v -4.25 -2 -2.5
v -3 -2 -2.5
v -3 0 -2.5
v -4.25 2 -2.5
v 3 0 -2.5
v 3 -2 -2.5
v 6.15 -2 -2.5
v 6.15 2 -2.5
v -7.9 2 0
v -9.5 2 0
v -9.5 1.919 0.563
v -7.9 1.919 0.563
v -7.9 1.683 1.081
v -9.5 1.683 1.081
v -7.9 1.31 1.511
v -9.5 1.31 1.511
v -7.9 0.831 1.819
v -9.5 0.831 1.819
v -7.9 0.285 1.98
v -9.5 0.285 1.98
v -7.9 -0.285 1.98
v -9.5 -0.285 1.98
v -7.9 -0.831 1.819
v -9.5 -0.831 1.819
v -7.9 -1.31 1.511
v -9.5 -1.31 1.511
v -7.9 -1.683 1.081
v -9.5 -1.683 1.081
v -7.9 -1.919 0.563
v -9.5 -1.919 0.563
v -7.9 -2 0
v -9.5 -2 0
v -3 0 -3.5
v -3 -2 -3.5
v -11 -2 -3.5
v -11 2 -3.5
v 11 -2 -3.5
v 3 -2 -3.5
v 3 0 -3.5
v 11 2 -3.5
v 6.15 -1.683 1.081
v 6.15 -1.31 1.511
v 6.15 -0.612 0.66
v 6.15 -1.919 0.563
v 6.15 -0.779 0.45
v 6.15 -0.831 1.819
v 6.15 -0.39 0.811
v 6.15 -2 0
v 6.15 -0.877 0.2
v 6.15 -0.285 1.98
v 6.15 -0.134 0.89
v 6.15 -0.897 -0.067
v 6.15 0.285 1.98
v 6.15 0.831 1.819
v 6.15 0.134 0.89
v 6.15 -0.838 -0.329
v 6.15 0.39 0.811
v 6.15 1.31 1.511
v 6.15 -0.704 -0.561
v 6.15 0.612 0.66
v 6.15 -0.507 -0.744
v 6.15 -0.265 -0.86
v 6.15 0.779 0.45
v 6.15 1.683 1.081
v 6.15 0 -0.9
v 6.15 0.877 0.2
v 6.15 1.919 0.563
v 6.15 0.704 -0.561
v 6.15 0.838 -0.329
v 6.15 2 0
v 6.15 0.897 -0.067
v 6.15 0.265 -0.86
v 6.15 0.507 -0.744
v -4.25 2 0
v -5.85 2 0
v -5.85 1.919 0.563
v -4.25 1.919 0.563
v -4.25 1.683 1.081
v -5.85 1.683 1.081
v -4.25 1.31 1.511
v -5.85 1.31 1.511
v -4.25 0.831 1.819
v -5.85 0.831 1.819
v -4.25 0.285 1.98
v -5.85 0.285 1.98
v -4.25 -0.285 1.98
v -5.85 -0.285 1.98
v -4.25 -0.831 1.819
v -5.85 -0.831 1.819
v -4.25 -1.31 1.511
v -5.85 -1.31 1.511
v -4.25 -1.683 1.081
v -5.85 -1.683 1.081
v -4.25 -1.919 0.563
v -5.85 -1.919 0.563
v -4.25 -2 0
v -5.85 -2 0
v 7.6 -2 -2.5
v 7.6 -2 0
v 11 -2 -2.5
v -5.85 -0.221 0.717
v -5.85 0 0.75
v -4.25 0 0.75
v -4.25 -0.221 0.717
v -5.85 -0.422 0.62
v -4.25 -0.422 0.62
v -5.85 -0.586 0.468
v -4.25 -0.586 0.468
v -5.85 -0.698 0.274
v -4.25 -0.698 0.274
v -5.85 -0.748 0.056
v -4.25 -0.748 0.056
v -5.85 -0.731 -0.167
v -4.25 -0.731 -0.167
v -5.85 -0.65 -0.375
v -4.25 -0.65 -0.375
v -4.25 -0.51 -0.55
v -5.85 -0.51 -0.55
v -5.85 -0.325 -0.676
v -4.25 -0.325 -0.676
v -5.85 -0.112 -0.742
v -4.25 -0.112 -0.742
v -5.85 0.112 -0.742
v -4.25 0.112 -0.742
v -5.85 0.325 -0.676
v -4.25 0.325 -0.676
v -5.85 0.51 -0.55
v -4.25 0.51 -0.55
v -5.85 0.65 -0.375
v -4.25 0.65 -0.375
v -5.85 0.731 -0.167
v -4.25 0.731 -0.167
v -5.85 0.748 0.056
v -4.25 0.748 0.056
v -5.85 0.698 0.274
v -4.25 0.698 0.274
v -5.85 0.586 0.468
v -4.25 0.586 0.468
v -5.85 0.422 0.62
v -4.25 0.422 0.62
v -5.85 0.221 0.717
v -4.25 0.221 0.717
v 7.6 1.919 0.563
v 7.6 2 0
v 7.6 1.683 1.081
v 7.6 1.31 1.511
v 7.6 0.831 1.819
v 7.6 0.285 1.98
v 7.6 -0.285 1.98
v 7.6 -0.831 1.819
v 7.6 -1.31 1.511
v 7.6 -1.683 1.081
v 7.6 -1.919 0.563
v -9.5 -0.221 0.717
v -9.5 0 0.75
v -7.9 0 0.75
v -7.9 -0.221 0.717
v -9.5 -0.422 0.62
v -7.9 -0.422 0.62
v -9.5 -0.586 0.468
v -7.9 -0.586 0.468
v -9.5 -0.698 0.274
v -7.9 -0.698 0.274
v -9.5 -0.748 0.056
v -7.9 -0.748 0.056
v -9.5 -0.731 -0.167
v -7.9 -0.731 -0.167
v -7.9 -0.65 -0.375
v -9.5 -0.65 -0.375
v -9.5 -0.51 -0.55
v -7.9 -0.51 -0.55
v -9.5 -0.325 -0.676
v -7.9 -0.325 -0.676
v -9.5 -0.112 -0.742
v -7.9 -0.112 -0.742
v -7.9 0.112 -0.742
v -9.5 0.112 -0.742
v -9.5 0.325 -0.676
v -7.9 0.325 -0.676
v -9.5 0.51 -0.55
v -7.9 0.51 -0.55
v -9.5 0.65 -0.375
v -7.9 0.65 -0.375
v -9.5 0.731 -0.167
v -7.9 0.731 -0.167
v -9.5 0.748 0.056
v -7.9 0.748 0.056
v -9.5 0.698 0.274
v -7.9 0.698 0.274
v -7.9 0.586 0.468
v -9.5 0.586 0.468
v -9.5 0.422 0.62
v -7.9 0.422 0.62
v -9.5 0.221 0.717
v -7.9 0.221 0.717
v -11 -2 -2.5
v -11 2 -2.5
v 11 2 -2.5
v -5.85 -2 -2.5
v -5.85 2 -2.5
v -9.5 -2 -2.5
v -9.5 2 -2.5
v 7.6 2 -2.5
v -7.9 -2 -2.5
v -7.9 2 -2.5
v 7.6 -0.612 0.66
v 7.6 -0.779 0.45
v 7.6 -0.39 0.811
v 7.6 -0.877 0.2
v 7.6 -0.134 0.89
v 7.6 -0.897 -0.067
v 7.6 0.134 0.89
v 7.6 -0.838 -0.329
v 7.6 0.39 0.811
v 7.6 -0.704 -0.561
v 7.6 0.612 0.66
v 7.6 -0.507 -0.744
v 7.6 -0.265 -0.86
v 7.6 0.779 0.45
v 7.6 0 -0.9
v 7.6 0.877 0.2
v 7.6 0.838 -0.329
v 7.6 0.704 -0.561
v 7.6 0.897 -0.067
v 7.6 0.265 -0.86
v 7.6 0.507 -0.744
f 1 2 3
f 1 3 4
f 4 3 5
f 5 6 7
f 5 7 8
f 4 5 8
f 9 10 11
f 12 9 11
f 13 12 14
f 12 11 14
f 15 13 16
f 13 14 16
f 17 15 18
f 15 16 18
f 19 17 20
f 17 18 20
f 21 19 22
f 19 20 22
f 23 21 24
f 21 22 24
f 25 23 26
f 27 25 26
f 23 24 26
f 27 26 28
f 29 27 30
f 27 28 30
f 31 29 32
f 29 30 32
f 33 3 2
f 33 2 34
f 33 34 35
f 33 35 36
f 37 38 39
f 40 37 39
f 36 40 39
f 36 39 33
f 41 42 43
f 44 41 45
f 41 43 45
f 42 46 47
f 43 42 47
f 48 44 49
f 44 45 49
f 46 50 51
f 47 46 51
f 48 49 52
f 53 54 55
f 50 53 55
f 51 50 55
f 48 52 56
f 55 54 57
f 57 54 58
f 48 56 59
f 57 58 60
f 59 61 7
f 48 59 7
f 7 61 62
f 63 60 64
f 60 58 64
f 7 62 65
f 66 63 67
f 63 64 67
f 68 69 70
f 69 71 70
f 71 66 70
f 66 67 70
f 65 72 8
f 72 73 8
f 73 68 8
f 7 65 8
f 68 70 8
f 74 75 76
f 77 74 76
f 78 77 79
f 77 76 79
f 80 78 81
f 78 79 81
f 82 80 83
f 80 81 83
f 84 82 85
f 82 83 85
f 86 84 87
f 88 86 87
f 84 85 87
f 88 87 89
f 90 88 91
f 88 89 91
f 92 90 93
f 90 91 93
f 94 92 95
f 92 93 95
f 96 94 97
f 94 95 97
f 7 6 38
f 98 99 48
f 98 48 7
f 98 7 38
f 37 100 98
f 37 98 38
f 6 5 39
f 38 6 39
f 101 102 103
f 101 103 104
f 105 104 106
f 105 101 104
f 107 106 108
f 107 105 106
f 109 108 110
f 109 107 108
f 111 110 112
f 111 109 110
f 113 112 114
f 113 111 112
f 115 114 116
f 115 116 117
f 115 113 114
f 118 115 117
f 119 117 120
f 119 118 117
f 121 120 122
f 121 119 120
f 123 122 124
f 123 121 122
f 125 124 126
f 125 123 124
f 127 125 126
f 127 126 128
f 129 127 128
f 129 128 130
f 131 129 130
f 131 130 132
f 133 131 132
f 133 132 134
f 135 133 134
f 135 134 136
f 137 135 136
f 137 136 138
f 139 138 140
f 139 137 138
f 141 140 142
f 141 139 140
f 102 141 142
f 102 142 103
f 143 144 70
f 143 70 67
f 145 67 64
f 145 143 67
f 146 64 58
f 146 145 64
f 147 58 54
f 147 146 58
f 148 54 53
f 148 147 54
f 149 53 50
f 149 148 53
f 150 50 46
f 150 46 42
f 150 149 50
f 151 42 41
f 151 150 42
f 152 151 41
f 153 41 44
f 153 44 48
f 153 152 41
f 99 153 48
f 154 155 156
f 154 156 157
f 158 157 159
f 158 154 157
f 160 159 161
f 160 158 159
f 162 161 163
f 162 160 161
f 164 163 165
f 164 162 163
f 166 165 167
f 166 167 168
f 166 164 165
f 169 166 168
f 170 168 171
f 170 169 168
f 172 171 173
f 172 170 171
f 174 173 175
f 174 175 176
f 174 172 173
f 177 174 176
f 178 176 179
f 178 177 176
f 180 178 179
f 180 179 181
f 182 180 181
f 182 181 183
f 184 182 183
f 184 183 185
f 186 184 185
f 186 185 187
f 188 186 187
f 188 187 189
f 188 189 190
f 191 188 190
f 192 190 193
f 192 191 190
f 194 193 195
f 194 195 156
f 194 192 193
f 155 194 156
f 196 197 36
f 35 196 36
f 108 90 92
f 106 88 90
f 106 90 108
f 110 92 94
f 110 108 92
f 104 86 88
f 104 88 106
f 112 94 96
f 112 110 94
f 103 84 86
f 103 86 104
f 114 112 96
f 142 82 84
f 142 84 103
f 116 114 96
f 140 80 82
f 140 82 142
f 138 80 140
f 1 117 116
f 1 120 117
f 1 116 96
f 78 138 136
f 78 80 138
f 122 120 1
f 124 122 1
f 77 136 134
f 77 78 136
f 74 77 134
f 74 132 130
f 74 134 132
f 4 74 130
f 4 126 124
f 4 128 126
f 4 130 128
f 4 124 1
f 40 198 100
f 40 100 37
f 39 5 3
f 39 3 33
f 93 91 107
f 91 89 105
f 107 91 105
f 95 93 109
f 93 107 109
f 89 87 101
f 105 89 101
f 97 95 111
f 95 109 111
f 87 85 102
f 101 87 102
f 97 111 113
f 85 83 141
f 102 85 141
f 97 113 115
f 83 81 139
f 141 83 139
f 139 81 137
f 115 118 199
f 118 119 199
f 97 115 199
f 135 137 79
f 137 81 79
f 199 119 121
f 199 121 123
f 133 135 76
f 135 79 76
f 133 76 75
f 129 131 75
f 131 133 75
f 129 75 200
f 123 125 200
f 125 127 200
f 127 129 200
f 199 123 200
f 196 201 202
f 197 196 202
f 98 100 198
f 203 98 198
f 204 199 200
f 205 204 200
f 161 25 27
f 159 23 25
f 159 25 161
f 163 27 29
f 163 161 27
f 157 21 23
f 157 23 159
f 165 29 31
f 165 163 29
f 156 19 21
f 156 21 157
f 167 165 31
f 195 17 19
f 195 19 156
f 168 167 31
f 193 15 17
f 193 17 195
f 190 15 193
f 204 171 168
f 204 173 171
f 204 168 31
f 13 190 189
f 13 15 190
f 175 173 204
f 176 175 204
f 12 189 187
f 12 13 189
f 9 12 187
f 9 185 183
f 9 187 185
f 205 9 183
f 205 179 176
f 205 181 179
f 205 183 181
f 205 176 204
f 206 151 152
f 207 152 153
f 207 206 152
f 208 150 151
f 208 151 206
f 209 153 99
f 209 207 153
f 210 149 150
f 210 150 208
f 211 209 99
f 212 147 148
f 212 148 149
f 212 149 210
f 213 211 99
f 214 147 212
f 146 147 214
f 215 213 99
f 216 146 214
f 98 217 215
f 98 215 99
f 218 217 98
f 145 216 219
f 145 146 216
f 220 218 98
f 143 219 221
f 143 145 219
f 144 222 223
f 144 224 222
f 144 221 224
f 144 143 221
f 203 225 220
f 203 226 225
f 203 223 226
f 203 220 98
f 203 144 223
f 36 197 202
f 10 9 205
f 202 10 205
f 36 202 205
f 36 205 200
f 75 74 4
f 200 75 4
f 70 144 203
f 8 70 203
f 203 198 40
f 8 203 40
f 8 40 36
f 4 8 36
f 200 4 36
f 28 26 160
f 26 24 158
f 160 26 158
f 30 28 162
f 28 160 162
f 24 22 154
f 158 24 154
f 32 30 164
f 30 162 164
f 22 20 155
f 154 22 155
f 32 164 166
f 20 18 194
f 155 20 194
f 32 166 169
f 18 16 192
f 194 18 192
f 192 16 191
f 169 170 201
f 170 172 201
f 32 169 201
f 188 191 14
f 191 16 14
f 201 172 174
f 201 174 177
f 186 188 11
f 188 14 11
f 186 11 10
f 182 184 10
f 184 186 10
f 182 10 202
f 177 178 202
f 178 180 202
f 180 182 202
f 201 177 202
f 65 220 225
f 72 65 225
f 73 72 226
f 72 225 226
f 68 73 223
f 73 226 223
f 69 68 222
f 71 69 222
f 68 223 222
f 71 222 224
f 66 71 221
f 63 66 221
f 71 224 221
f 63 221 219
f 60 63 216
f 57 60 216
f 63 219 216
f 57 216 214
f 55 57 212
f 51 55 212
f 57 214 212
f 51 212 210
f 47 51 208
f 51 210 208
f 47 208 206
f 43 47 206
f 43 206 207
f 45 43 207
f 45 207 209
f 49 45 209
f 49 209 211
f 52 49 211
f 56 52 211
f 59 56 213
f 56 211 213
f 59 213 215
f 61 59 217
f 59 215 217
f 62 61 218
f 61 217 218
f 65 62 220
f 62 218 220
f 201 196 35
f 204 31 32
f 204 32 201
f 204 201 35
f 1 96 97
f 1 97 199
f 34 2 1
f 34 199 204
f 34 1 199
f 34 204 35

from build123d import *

# Parameters (mm, degrees)
BOSS_EXTRUDE1_START = -9.5
SKETCH1_R           = 0.75
BOSS_EXTRUDE1_DEPTH = 1.6
BOSS_EXTRUDE2_START = -5.85
SKETCH1_3_R         = 0.75
BOSS_EXTRUDE2_DEPTH = 1.6
BOSS_EXTRUDE5_START = 7.6
SKETCH1_5_R         = 2
SKETCH1_5_R_2       = 0.9
BOSS_EXTRUDE5_DEPTH = 1.45
BOSS_EXTRUDE3_START = 11
SKETCH1_4_W         = 1
SKETCH1_4_H         = 4
BOSS_EXTRUDE3_DEPTH = 22
CUT_EXTRUDE1_START  = 3
SKETCH1_6_W         = 1
SKETCH1_6_H         = 2
CUT_EXTRUDE1_DEPTH  = 6


with BuildPart() as part:
    # Sketch1 → Boss-Extrude1 (new body)
    with BuildSketch(Plane(origin=(0, 0, 0), x_dir=(0, 0, -1), z_dir=(1, 0, 0)).offset(BOSS_EXTRUDE1_START)):
        with BuildLine():
            Line((2.5, 2), (0, 2))
            ThreePointArc((0, 2), (-2, 0), (0, -2))
            Line((0, -2), (2.5, -2))
            Line((2.5, -2), (2.5, 2))
        make_face()
        with Locations(Location((0, 0, 0), (0, 0, 180))):
            Circle(SKETCH1_R, mode=Mode.SUBTRACT)
    extrude(amount=BOSS_EXTRUDE1_DEPTH)



with BuildPart() as body_2:
    # Sketch1<3> → Boss-Extrude2 (new body)
    with BuildSketch(Plane(origin=(0, 0, 0), x_dir=(0, 0, -1), z_dir=(1, 0, 0)).offset(BOSS_EXTRUDE2_START)):
        with BuildLine():
            Line((2.5, 2), (0, 2))
            ThreePointArc((0, 2), (-2, 0), (0, -2))
            Line((0, -2), (2.5, -2))
            Line((2.5, -2), (2.5, 2))
        make_face()
        with Locations(Location((0, 0, 0), (0, 0, 180))):
            Circle(SKETCH1_3_R, mode=Mode.SUBTRACT)
    extrude(amount=BOSS_EXTRUDE2_DEPTH)


with BuildPart() as body_3:
    # Sketch1<5> → Boss-Extrude5 (new body)
    with BuildSketch(Plane(origin=(0, 0, 0), x_dir=(0, 0, -1), z_dir=(1, 0, 0)).offset(BOSS_EXTRUDE5_START)):
        Circle(SKETCH1_5_R)
        Circle(SKETCH1_5_R_2, mode=Mode.SUBTRACT)
        with BuildLine():
            Line((2.5, 2), (0, 2))
            ThreePointArc((0, 2), (1.414213562, 1.414213562), (2, 0))
            ThreePointArc((2, 0), (1.414213562, -1.414213562), (0, -2))
            Line((0, -2), (2.5, -2))
            Line((2.5, -2), (2.5, 0))
            Line((2.5, 0), (2.5, 2))
        make_face()
    extrude(amount=-BOSS_EXTRUDE5_DEPTH)


with BuildPart() as part_1:
    add(part.part)

    add(body_2.part)  # Boss-Extrude3 merges body 2

    add(body_3.part)  # Boss-Extrude3 merges body 3
    # Sketch1<4> → Boss-Extrude3 (add)
    with BuildSketch(Plane(origin=(0, 0, 0), x_dir=(0, 0, -1), z_dir=(1, 0, 0)).offset(BOSS_EXTRUDE3_START)):
        with Locations((3, 0)):
            Rectangle(SKETCH1_4_W, SKETCH1_4_H)
    extrude(amount=-BOSS_EXTRUDE3_DEPTH)

    # Sketch1<6> → Cut-Extrude1 (cut)
    with BuildSketch(Plane(origin=(0, 0, 0), x_dir=(0, 0, -1), z_dir=(1, 0, 0)).offset(CUT_EXTRUDE1_START)):
        with Locations((3, -1)):
            Rectangle(SKETCH1_6_W, SKETCH1_6_H)
    extrude(amount=-CUT_EXTRUDE1_DEPTH, mode=Mode.SUBTRACT)


solid = part_1.part
